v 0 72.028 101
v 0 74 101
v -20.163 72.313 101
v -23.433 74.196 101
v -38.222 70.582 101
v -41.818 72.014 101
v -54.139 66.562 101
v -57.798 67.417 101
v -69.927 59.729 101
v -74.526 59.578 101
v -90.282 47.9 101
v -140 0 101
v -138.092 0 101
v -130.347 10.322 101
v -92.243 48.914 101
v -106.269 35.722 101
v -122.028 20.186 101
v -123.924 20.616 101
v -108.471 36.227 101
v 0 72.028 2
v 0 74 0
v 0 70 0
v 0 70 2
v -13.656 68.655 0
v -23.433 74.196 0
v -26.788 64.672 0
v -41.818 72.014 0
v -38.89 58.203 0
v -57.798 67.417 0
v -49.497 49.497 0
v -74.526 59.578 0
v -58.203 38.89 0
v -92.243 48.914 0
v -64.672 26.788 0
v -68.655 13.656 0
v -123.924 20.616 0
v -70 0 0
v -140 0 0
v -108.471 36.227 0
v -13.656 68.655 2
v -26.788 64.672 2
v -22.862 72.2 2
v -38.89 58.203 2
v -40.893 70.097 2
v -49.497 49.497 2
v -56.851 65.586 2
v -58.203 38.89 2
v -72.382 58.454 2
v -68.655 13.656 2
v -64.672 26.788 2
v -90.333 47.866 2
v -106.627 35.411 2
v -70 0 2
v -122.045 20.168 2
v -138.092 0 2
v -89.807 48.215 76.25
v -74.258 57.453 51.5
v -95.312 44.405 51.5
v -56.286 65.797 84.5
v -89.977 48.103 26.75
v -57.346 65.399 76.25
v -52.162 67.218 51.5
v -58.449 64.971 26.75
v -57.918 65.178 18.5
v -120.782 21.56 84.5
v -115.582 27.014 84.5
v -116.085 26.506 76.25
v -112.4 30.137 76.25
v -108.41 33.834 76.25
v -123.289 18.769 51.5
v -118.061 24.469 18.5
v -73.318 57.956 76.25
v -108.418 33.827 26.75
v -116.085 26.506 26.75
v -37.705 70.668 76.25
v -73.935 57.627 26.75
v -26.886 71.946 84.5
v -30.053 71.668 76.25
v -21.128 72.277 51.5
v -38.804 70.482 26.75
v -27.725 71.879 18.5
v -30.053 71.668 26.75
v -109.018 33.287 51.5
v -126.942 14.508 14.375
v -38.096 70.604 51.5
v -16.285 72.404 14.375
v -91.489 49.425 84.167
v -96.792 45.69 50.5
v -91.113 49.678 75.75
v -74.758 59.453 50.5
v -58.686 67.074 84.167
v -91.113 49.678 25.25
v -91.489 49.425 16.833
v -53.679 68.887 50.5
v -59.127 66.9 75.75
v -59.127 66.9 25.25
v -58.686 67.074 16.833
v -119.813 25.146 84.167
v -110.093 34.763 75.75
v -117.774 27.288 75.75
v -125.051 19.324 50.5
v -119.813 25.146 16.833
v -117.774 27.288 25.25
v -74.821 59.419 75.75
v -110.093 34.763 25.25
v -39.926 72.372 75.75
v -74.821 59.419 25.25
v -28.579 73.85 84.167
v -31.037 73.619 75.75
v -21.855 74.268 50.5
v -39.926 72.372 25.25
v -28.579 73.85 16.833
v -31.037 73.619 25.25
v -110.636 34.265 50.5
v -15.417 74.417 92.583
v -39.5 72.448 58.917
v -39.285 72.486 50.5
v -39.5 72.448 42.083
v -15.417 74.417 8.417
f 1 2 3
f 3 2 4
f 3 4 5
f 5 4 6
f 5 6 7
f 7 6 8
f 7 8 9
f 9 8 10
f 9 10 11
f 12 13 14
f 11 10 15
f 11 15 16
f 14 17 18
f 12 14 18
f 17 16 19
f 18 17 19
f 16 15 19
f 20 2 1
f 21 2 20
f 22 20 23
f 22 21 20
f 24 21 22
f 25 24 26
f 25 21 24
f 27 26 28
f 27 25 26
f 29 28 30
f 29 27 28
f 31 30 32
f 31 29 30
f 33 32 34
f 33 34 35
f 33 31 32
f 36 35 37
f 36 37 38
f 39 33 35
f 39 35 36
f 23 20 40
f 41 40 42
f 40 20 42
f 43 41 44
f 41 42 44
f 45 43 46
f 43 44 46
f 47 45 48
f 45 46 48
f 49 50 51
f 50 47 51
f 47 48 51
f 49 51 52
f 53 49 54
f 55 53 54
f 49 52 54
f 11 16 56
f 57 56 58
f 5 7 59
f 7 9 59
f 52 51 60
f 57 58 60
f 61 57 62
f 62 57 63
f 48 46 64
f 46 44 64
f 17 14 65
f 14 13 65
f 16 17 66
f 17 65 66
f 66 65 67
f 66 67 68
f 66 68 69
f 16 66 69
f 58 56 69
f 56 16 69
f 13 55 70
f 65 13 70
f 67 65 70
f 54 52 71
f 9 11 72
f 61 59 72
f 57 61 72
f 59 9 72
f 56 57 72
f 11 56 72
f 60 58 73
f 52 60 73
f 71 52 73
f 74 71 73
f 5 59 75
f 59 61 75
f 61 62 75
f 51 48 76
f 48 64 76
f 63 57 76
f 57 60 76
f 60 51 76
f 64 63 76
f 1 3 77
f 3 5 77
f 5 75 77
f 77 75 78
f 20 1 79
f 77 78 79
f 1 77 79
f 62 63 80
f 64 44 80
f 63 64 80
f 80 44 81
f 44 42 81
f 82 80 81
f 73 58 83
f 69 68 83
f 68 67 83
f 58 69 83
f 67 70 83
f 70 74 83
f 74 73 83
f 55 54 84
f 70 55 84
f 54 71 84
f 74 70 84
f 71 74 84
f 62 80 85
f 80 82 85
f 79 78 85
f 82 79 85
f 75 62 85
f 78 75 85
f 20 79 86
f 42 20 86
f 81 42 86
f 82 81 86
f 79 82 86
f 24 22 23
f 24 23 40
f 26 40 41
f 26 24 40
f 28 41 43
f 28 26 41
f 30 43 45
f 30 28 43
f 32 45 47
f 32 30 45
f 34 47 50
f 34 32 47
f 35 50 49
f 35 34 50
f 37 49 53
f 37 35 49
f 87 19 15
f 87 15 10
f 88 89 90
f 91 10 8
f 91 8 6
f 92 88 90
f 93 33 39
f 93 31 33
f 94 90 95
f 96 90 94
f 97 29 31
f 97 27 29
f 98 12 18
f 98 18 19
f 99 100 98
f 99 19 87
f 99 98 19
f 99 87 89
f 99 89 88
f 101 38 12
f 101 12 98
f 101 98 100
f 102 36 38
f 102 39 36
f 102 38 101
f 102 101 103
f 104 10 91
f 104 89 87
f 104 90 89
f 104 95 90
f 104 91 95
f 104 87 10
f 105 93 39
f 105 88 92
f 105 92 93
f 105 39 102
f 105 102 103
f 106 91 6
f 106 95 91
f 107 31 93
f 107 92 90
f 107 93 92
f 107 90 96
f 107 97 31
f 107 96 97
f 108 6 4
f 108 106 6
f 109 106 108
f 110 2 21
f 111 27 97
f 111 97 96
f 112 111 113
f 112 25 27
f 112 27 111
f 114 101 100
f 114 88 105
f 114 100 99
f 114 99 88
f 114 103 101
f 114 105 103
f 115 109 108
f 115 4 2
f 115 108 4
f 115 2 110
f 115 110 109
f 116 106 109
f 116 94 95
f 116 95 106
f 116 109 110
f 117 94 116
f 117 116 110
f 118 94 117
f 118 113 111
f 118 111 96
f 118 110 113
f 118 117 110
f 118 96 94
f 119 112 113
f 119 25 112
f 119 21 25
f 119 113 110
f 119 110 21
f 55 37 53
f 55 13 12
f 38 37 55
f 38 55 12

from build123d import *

# Parameters (mm, degrees)
PAD001_DEPTH = 101
PAD_DEPTH    = 101


with BuildPart() as body001:
    # Sketch001 → Pad001 (new body)
    with BuildSketch(Plane.XY):
        with BuildLine():
            ThreePointArc((0, 70), (-49.497475, 49.497475), (-70, 0))
            Line((-70, 0), (-140, 0))
            add(Edge.make_bspline(
                [(-140, 0), (-116.215675, 34.108066), (-72.307575, 63.782966), (-38.201575, 76.136366), (0, 74)],
                knots=[0, 0, 0, 0, 0.5, 1, 1, 1, 1], degree=3))
            Line((0, 74), (0, 70))
        make_face()
    extrude(amount=PAD001_DEPTH)


with BuildPart() as body001_1:
    # Body001 placement: moved
    add(body001.part.moved(Location((0.5, -2, 2))))


with BuildPart() as cut:
    # Sketch → Pad (new body)
    with BuildSketch(Plane.XY):
        with BuildLine():
            ThreePointArc((0, 70), (-49.497475, 49.497475), (-70, 0))
            Line((-70, 0), (-140, 0))
            add(Edge.make_bspline(
                [(-140, 0), (-116.215675, 34.108066), (-72.307575, 63.782966), (-38.201575, 76.136366), (0, 74)],
                knots=[0, 0, 0, 0, 0.5, 1, 1, 1, 1], degree=3))
            Line((0, 74), (0, 70))
        make_face()
    extrude(amount=PAD_DEPTH)

    # Cut: cut Body001
    add(body001_1.part, mode=Mode.SUBTRACT)


solid = cut.part
